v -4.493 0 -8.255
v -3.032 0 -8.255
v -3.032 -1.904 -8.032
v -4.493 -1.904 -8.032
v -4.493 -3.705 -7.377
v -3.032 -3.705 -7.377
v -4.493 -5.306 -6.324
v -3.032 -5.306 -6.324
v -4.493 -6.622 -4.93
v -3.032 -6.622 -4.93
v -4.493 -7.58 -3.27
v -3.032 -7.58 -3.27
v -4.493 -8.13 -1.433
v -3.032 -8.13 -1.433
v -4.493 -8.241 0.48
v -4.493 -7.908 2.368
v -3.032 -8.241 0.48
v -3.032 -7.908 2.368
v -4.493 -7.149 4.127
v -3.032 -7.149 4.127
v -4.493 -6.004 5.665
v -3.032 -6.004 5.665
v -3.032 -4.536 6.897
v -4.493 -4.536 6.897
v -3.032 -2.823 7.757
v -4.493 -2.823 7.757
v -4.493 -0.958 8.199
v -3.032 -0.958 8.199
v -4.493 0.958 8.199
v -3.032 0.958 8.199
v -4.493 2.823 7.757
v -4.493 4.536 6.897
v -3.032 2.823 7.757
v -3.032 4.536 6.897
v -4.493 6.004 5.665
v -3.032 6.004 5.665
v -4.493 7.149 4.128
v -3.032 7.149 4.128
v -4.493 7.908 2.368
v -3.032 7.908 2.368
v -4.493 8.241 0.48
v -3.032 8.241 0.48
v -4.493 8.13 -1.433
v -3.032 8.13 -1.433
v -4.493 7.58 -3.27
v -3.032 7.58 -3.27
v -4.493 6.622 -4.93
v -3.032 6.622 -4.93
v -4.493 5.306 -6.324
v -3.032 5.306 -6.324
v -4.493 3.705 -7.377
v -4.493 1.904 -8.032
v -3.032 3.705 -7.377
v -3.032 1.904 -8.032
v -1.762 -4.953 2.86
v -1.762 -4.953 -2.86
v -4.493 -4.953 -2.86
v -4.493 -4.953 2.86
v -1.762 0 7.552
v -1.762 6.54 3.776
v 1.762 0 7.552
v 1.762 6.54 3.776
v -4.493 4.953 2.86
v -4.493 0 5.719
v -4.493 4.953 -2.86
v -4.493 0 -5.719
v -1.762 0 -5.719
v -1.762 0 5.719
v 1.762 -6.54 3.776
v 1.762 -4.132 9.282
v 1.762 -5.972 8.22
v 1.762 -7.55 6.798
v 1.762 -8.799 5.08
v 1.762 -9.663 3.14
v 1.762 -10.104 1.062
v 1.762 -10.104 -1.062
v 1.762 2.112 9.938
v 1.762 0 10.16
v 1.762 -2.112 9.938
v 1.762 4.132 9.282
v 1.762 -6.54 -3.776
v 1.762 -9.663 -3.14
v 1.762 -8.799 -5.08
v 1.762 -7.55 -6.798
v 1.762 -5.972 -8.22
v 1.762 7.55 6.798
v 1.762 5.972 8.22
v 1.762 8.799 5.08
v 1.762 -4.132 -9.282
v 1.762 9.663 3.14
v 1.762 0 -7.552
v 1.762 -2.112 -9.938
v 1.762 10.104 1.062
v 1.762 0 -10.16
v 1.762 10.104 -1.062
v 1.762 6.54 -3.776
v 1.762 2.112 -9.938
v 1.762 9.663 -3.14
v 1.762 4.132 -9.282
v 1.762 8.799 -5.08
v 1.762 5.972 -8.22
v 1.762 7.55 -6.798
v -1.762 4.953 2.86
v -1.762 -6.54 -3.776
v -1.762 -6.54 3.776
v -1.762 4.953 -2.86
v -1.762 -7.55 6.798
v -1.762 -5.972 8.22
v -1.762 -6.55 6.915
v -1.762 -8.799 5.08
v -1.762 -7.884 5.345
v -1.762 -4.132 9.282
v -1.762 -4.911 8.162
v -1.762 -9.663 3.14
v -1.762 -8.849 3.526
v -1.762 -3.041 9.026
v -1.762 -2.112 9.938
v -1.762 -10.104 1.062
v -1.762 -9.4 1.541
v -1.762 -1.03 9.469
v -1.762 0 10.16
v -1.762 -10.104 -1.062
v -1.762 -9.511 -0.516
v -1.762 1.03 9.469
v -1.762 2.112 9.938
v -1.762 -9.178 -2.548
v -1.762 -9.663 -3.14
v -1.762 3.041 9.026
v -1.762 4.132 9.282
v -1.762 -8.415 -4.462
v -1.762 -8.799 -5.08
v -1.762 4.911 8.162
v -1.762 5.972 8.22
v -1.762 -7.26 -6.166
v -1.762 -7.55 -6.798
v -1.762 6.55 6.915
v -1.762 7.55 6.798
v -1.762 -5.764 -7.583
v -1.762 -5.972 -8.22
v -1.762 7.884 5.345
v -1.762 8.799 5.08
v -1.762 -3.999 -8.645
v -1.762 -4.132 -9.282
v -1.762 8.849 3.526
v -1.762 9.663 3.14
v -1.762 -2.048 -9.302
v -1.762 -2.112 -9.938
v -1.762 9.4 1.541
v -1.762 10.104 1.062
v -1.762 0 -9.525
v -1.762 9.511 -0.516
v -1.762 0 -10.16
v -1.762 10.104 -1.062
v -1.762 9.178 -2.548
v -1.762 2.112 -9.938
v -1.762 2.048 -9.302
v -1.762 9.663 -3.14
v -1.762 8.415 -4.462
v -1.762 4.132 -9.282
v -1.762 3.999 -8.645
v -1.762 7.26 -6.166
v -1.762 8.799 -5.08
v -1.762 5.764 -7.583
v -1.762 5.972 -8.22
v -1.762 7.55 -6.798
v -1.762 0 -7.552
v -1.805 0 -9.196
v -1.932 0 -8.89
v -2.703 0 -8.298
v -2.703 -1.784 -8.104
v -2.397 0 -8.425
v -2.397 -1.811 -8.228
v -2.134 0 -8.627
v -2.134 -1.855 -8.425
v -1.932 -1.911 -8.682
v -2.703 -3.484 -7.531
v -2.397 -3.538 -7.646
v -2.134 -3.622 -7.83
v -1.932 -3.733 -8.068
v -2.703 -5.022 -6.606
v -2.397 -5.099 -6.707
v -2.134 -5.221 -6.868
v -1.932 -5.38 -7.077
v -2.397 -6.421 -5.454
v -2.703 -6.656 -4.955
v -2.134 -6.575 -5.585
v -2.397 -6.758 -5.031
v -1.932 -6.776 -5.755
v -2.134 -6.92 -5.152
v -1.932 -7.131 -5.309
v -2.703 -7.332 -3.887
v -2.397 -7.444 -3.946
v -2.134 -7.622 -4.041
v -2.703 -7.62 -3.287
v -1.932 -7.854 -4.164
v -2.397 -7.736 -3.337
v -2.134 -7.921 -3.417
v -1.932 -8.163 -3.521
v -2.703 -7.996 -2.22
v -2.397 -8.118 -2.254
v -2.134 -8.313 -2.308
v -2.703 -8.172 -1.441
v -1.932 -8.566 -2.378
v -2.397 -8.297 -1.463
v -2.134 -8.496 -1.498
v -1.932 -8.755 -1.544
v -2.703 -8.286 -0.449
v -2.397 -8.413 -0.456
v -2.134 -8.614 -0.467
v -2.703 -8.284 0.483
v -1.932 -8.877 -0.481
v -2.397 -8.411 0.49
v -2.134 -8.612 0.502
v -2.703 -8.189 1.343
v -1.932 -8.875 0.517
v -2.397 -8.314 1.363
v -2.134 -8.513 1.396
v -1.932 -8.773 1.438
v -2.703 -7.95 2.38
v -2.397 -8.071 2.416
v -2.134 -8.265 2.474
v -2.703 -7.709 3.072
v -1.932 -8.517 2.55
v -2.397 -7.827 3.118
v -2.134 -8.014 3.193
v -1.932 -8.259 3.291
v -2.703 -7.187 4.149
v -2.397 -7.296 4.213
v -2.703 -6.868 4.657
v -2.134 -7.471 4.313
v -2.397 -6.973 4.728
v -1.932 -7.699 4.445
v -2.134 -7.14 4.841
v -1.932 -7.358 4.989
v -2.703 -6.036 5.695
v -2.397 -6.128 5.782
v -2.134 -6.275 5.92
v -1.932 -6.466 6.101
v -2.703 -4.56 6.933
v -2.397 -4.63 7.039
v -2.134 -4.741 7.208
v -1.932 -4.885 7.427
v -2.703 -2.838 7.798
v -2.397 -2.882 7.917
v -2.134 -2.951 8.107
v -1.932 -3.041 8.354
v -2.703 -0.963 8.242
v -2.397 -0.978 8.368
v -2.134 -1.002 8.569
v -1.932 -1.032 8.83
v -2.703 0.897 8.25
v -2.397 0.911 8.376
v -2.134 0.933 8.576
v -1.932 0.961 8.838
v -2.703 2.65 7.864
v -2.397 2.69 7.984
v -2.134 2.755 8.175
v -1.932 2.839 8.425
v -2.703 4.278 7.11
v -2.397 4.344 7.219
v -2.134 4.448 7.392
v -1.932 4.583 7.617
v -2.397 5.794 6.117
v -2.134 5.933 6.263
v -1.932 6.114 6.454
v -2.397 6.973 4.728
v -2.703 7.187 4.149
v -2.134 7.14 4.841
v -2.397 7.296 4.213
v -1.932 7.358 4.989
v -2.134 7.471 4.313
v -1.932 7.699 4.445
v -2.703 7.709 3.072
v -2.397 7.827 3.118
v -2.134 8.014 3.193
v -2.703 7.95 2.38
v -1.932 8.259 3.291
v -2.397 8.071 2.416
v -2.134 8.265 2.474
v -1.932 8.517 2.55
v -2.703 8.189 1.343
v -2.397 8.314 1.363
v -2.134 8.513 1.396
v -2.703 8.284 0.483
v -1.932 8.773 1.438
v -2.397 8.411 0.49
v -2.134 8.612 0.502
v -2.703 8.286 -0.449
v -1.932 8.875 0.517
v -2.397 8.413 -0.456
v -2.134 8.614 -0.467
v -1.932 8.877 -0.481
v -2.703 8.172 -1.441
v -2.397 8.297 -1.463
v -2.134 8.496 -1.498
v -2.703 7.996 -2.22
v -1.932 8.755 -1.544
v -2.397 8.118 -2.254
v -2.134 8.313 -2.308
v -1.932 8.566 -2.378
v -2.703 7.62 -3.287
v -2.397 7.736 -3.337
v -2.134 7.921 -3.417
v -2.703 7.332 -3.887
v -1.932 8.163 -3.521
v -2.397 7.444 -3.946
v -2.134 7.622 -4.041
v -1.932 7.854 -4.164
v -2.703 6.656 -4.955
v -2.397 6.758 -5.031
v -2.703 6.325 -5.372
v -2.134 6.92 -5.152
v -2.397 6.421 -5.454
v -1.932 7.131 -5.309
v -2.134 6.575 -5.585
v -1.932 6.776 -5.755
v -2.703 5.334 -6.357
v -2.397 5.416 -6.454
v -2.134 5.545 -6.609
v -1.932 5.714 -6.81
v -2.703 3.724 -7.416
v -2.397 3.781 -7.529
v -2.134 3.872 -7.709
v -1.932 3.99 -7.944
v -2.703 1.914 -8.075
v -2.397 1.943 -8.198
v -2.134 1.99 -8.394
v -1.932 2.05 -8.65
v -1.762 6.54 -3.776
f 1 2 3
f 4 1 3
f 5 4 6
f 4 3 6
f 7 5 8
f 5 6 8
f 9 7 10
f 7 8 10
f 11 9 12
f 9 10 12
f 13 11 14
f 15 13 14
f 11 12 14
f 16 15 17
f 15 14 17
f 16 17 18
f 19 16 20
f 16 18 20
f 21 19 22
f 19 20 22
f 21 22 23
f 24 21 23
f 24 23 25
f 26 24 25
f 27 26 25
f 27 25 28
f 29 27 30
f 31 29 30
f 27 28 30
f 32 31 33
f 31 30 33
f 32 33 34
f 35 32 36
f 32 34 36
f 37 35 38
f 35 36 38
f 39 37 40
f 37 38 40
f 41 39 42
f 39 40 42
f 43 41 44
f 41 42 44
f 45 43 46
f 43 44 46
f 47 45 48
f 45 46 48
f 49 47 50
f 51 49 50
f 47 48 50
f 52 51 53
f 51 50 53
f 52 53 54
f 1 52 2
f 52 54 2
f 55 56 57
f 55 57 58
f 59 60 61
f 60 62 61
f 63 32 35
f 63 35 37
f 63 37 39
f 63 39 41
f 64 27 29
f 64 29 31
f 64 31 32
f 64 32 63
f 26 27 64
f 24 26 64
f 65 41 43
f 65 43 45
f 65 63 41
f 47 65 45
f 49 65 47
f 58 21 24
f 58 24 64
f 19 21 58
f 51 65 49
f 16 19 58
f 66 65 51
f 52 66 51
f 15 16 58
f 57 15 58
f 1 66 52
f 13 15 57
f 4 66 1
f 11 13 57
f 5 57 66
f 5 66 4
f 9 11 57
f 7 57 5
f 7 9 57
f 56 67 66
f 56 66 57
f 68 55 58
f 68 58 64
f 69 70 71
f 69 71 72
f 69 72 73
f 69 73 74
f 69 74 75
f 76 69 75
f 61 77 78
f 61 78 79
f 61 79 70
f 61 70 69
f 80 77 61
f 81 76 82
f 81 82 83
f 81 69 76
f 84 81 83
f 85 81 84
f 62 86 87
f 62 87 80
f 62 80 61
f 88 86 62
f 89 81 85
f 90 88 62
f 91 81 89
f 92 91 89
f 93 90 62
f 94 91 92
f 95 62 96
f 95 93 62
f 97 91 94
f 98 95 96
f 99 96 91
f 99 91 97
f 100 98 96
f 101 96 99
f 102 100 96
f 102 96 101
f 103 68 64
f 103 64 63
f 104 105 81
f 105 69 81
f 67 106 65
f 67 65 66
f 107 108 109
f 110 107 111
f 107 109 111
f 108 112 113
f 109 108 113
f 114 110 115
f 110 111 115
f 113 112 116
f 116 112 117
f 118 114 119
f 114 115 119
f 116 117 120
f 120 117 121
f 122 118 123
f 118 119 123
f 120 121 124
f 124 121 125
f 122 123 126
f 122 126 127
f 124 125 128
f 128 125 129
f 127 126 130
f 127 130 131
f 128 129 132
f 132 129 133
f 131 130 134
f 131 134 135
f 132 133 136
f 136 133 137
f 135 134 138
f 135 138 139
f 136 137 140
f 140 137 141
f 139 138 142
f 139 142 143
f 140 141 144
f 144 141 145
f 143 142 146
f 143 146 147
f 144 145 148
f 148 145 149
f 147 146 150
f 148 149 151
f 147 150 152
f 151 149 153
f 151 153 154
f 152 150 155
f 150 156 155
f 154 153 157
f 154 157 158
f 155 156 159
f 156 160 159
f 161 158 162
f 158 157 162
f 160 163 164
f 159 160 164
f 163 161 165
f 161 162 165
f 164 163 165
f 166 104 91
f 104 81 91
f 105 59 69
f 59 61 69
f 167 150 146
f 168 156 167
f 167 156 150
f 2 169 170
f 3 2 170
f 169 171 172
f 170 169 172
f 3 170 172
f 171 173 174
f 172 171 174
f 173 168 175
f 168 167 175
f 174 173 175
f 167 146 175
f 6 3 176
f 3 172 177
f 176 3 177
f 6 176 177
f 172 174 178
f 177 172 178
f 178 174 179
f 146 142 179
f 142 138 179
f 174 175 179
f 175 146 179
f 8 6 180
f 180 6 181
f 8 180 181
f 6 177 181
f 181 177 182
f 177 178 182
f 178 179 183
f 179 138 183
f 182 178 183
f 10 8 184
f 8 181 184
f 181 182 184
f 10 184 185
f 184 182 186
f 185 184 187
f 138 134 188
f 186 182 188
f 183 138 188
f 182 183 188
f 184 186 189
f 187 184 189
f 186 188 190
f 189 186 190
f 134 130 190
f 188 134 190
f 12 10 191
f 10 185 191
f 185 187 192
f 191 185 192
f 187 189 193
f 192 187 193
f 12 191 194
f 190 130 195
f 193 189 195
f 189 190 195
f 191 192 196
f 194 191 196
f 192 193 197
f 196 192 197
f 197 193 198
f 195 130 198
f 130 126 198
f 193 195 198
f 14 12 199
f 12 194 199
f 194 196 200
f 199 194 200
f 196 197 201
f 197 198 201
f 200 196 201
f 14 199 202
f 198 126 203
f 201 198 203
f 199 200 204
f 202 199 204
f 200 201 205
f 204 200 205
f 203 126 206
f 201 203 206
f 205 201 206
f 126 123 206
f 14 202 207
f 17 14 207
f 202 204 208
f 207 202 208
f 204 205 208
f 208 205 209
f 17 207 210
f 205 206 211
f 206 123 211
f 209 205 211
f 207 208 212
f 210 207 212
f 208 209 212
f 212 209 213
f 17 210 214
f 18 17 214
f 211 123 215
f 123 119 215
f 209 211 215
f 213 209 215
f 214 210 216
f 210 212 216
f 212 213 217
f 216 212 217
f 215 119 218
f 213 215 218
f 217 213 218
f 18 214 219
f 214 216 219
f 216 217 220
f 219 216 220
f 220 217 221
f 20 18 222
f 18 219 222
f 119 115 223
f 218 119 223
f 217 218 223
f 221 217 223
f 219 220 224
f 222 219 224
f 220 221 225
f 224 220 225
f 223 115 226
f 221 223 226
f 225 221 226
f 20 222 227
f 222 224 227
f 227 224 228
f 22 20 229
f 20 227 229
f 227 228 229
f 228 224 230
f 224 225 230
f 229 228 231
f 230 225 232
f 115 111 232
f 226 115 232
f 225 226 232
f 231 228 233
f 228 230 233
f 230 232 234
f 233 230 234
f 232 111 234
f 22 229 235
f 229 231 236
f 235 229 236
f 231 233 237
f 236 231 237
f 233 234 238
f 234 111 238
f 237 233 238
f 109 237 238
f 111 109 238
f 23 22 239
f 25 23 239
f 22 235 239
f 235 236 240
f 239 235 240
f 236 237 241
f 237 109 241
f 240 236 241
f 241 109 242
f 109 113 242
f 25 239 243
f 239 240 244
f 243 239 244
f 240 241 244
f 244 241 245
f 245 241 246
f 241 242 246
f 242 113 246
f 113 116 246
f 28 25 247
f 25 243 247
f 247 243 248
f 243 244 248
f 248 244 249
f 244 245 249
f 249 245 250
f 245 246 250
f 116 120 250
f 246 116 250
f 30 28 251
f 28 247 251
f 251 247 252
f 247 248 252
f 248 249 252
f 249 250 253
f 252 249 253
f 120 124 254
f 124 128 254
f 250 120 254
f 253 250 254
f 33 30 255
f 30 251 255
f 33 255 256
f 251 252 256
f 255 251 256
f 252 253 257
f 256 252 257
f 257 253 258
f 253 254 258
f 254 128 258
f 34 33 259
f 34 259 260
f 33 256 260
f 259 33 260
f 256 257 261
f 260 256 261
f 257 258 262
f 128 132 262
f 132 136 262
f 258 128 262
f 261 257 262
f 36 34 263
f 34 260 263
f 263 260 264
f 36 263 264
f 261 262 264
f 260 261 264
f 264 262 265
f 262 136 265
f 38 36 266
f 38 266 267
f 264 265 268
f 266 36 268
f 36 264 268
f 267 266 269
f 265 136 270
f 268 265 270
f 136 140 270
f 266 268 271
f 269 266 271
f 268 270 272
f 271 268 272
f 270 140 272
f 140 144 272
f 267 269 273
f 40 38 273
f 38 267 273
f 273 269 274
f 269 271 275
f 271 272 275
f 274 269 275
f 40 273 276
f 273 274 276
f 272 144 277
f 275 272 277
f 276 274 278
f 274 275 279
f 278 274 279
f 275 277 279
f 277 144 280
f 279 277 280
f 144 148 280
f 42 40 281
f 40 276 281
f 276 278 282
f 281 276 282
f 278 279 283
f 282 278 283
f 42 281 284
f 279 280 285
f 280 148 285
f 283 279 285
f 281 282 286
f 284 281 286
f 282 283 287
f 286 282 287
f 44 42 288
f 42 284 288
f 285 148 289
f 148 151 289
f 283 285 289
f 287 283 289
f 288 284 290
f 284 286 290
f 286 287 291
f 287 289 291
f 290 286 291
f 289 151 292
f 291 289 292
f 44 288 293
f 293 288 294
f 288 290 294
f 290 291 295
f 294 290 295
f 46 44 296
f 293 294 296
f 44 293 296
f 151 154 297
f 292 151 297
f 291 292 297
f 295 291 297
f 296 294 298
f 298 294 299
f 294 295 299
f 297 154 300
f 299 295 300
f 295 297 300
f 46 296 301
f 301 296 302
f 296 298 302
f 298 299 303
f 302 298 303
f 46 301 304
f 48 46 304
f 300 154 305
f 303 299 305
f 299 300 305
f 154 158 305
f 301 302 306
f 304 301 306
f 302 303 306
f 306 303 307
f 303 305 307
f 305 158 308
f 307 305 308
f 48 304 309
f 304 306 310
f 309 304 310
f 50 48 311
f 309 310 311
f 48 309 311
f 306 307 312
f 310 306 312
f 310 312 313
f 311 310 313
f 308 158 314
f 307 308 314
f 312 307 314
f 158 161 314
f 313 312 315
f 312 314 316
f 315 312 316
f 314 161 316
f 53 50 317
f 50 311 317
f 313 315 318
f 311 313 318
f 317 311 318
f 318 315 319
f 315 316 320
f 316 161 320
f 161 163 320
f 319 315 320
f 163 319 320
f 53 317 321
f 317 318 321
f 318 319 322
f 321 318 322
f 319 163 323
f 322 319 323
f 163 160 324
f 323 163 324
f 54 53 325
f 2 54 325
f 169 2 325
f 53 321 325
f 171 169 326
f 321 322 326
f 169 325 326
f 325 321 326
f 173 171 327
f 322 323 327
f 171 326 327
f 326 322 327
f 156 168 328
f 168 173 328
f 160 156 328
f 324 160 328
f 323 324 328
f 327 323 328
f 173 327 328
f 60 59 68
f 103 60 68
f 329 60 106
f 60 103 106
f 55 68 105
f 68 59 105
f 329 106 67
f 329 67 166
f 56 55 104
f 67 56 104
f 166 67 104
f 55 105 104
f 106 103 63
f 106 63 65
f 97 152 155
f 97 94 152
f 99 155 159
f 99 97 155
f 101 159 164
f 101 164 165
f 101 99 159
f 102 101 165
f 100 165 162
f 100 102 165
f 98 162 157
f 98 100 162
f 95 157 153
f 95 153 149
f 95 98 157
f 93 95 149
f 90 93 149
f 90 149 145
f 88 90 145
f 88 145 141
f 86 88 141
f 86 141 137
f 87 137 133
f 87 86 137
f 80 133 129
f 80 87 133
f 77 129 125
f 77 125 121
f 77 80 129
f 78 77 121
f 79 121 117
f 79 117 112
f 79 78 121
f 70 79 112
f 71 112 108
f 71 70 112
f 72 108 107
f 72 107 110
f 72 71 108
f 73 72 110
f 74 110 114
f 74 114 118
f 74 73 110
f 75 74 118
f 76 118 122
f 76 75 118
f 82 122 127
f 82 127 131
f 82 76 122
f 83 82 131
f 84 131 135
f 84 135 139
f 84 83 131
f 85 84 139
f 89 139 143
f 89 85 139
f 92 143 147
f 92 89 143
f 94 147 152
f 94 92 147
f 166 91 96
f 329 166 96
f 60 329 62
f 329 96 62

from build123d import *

# Parameters (mm, degrees)
SKETCH1_R           = 10.16
BOSS_EXTRUDE1_DEPTH = 1.762125
SKETCH2_R           = 8.255
BOSS_EXTRUDE2_DEPTH = 2.7305
FILLET1_R           = 1.27


with BuildPart() as part:
    # Sketch1 → Boss-Extrude1 (new, symmetric)
    with BuildSketch(Plane(origin=(0, 0, 0), x_dir=(0, 0, -1), z_dir=(1, 0, 0))):
        Circle(SKETCH1_R)
        Polygon((7.552318871, 0), (3.776159436, 6.5405), (-3.776159436, 6.5405), (-7.552318871, 0), (-3.776159436, -6.5405), (3.776159436, -6.5405), align=None, mode=Mode.SUBTRACT)
    extrude(amount=BOSS_EXTRUDE1_DEPTH, both=True)

    # Sketch2 → Boss-Extrude2 (add)
    with BuildSketch(Plane.ZY.offset(1.762125)):
        with Locations(Location((0, 0, 0), (0, 0, 180))):
            Circle(SKETCH2_R)
        Polygon((5.719231767, 0), (2.859615883, 4.953), (-2.859615883, 4.953), (-5.719231767, 0), (-2.859615883, -4.953), (2.859615883, -4.953), align=None, mode=Mode.SUBTRACT)
    extrude(amount=BOSS_EXTRUDE2_DEPTH)

    # Fillet1
    fillet1_edges = [part.edges().sort_by_distance(p)[0] for p in [
        (-1.762125, 0, 8.255),
    ]]
    fillet(fillet1_edges, radius=FILLET1_R)


solid = part.part
